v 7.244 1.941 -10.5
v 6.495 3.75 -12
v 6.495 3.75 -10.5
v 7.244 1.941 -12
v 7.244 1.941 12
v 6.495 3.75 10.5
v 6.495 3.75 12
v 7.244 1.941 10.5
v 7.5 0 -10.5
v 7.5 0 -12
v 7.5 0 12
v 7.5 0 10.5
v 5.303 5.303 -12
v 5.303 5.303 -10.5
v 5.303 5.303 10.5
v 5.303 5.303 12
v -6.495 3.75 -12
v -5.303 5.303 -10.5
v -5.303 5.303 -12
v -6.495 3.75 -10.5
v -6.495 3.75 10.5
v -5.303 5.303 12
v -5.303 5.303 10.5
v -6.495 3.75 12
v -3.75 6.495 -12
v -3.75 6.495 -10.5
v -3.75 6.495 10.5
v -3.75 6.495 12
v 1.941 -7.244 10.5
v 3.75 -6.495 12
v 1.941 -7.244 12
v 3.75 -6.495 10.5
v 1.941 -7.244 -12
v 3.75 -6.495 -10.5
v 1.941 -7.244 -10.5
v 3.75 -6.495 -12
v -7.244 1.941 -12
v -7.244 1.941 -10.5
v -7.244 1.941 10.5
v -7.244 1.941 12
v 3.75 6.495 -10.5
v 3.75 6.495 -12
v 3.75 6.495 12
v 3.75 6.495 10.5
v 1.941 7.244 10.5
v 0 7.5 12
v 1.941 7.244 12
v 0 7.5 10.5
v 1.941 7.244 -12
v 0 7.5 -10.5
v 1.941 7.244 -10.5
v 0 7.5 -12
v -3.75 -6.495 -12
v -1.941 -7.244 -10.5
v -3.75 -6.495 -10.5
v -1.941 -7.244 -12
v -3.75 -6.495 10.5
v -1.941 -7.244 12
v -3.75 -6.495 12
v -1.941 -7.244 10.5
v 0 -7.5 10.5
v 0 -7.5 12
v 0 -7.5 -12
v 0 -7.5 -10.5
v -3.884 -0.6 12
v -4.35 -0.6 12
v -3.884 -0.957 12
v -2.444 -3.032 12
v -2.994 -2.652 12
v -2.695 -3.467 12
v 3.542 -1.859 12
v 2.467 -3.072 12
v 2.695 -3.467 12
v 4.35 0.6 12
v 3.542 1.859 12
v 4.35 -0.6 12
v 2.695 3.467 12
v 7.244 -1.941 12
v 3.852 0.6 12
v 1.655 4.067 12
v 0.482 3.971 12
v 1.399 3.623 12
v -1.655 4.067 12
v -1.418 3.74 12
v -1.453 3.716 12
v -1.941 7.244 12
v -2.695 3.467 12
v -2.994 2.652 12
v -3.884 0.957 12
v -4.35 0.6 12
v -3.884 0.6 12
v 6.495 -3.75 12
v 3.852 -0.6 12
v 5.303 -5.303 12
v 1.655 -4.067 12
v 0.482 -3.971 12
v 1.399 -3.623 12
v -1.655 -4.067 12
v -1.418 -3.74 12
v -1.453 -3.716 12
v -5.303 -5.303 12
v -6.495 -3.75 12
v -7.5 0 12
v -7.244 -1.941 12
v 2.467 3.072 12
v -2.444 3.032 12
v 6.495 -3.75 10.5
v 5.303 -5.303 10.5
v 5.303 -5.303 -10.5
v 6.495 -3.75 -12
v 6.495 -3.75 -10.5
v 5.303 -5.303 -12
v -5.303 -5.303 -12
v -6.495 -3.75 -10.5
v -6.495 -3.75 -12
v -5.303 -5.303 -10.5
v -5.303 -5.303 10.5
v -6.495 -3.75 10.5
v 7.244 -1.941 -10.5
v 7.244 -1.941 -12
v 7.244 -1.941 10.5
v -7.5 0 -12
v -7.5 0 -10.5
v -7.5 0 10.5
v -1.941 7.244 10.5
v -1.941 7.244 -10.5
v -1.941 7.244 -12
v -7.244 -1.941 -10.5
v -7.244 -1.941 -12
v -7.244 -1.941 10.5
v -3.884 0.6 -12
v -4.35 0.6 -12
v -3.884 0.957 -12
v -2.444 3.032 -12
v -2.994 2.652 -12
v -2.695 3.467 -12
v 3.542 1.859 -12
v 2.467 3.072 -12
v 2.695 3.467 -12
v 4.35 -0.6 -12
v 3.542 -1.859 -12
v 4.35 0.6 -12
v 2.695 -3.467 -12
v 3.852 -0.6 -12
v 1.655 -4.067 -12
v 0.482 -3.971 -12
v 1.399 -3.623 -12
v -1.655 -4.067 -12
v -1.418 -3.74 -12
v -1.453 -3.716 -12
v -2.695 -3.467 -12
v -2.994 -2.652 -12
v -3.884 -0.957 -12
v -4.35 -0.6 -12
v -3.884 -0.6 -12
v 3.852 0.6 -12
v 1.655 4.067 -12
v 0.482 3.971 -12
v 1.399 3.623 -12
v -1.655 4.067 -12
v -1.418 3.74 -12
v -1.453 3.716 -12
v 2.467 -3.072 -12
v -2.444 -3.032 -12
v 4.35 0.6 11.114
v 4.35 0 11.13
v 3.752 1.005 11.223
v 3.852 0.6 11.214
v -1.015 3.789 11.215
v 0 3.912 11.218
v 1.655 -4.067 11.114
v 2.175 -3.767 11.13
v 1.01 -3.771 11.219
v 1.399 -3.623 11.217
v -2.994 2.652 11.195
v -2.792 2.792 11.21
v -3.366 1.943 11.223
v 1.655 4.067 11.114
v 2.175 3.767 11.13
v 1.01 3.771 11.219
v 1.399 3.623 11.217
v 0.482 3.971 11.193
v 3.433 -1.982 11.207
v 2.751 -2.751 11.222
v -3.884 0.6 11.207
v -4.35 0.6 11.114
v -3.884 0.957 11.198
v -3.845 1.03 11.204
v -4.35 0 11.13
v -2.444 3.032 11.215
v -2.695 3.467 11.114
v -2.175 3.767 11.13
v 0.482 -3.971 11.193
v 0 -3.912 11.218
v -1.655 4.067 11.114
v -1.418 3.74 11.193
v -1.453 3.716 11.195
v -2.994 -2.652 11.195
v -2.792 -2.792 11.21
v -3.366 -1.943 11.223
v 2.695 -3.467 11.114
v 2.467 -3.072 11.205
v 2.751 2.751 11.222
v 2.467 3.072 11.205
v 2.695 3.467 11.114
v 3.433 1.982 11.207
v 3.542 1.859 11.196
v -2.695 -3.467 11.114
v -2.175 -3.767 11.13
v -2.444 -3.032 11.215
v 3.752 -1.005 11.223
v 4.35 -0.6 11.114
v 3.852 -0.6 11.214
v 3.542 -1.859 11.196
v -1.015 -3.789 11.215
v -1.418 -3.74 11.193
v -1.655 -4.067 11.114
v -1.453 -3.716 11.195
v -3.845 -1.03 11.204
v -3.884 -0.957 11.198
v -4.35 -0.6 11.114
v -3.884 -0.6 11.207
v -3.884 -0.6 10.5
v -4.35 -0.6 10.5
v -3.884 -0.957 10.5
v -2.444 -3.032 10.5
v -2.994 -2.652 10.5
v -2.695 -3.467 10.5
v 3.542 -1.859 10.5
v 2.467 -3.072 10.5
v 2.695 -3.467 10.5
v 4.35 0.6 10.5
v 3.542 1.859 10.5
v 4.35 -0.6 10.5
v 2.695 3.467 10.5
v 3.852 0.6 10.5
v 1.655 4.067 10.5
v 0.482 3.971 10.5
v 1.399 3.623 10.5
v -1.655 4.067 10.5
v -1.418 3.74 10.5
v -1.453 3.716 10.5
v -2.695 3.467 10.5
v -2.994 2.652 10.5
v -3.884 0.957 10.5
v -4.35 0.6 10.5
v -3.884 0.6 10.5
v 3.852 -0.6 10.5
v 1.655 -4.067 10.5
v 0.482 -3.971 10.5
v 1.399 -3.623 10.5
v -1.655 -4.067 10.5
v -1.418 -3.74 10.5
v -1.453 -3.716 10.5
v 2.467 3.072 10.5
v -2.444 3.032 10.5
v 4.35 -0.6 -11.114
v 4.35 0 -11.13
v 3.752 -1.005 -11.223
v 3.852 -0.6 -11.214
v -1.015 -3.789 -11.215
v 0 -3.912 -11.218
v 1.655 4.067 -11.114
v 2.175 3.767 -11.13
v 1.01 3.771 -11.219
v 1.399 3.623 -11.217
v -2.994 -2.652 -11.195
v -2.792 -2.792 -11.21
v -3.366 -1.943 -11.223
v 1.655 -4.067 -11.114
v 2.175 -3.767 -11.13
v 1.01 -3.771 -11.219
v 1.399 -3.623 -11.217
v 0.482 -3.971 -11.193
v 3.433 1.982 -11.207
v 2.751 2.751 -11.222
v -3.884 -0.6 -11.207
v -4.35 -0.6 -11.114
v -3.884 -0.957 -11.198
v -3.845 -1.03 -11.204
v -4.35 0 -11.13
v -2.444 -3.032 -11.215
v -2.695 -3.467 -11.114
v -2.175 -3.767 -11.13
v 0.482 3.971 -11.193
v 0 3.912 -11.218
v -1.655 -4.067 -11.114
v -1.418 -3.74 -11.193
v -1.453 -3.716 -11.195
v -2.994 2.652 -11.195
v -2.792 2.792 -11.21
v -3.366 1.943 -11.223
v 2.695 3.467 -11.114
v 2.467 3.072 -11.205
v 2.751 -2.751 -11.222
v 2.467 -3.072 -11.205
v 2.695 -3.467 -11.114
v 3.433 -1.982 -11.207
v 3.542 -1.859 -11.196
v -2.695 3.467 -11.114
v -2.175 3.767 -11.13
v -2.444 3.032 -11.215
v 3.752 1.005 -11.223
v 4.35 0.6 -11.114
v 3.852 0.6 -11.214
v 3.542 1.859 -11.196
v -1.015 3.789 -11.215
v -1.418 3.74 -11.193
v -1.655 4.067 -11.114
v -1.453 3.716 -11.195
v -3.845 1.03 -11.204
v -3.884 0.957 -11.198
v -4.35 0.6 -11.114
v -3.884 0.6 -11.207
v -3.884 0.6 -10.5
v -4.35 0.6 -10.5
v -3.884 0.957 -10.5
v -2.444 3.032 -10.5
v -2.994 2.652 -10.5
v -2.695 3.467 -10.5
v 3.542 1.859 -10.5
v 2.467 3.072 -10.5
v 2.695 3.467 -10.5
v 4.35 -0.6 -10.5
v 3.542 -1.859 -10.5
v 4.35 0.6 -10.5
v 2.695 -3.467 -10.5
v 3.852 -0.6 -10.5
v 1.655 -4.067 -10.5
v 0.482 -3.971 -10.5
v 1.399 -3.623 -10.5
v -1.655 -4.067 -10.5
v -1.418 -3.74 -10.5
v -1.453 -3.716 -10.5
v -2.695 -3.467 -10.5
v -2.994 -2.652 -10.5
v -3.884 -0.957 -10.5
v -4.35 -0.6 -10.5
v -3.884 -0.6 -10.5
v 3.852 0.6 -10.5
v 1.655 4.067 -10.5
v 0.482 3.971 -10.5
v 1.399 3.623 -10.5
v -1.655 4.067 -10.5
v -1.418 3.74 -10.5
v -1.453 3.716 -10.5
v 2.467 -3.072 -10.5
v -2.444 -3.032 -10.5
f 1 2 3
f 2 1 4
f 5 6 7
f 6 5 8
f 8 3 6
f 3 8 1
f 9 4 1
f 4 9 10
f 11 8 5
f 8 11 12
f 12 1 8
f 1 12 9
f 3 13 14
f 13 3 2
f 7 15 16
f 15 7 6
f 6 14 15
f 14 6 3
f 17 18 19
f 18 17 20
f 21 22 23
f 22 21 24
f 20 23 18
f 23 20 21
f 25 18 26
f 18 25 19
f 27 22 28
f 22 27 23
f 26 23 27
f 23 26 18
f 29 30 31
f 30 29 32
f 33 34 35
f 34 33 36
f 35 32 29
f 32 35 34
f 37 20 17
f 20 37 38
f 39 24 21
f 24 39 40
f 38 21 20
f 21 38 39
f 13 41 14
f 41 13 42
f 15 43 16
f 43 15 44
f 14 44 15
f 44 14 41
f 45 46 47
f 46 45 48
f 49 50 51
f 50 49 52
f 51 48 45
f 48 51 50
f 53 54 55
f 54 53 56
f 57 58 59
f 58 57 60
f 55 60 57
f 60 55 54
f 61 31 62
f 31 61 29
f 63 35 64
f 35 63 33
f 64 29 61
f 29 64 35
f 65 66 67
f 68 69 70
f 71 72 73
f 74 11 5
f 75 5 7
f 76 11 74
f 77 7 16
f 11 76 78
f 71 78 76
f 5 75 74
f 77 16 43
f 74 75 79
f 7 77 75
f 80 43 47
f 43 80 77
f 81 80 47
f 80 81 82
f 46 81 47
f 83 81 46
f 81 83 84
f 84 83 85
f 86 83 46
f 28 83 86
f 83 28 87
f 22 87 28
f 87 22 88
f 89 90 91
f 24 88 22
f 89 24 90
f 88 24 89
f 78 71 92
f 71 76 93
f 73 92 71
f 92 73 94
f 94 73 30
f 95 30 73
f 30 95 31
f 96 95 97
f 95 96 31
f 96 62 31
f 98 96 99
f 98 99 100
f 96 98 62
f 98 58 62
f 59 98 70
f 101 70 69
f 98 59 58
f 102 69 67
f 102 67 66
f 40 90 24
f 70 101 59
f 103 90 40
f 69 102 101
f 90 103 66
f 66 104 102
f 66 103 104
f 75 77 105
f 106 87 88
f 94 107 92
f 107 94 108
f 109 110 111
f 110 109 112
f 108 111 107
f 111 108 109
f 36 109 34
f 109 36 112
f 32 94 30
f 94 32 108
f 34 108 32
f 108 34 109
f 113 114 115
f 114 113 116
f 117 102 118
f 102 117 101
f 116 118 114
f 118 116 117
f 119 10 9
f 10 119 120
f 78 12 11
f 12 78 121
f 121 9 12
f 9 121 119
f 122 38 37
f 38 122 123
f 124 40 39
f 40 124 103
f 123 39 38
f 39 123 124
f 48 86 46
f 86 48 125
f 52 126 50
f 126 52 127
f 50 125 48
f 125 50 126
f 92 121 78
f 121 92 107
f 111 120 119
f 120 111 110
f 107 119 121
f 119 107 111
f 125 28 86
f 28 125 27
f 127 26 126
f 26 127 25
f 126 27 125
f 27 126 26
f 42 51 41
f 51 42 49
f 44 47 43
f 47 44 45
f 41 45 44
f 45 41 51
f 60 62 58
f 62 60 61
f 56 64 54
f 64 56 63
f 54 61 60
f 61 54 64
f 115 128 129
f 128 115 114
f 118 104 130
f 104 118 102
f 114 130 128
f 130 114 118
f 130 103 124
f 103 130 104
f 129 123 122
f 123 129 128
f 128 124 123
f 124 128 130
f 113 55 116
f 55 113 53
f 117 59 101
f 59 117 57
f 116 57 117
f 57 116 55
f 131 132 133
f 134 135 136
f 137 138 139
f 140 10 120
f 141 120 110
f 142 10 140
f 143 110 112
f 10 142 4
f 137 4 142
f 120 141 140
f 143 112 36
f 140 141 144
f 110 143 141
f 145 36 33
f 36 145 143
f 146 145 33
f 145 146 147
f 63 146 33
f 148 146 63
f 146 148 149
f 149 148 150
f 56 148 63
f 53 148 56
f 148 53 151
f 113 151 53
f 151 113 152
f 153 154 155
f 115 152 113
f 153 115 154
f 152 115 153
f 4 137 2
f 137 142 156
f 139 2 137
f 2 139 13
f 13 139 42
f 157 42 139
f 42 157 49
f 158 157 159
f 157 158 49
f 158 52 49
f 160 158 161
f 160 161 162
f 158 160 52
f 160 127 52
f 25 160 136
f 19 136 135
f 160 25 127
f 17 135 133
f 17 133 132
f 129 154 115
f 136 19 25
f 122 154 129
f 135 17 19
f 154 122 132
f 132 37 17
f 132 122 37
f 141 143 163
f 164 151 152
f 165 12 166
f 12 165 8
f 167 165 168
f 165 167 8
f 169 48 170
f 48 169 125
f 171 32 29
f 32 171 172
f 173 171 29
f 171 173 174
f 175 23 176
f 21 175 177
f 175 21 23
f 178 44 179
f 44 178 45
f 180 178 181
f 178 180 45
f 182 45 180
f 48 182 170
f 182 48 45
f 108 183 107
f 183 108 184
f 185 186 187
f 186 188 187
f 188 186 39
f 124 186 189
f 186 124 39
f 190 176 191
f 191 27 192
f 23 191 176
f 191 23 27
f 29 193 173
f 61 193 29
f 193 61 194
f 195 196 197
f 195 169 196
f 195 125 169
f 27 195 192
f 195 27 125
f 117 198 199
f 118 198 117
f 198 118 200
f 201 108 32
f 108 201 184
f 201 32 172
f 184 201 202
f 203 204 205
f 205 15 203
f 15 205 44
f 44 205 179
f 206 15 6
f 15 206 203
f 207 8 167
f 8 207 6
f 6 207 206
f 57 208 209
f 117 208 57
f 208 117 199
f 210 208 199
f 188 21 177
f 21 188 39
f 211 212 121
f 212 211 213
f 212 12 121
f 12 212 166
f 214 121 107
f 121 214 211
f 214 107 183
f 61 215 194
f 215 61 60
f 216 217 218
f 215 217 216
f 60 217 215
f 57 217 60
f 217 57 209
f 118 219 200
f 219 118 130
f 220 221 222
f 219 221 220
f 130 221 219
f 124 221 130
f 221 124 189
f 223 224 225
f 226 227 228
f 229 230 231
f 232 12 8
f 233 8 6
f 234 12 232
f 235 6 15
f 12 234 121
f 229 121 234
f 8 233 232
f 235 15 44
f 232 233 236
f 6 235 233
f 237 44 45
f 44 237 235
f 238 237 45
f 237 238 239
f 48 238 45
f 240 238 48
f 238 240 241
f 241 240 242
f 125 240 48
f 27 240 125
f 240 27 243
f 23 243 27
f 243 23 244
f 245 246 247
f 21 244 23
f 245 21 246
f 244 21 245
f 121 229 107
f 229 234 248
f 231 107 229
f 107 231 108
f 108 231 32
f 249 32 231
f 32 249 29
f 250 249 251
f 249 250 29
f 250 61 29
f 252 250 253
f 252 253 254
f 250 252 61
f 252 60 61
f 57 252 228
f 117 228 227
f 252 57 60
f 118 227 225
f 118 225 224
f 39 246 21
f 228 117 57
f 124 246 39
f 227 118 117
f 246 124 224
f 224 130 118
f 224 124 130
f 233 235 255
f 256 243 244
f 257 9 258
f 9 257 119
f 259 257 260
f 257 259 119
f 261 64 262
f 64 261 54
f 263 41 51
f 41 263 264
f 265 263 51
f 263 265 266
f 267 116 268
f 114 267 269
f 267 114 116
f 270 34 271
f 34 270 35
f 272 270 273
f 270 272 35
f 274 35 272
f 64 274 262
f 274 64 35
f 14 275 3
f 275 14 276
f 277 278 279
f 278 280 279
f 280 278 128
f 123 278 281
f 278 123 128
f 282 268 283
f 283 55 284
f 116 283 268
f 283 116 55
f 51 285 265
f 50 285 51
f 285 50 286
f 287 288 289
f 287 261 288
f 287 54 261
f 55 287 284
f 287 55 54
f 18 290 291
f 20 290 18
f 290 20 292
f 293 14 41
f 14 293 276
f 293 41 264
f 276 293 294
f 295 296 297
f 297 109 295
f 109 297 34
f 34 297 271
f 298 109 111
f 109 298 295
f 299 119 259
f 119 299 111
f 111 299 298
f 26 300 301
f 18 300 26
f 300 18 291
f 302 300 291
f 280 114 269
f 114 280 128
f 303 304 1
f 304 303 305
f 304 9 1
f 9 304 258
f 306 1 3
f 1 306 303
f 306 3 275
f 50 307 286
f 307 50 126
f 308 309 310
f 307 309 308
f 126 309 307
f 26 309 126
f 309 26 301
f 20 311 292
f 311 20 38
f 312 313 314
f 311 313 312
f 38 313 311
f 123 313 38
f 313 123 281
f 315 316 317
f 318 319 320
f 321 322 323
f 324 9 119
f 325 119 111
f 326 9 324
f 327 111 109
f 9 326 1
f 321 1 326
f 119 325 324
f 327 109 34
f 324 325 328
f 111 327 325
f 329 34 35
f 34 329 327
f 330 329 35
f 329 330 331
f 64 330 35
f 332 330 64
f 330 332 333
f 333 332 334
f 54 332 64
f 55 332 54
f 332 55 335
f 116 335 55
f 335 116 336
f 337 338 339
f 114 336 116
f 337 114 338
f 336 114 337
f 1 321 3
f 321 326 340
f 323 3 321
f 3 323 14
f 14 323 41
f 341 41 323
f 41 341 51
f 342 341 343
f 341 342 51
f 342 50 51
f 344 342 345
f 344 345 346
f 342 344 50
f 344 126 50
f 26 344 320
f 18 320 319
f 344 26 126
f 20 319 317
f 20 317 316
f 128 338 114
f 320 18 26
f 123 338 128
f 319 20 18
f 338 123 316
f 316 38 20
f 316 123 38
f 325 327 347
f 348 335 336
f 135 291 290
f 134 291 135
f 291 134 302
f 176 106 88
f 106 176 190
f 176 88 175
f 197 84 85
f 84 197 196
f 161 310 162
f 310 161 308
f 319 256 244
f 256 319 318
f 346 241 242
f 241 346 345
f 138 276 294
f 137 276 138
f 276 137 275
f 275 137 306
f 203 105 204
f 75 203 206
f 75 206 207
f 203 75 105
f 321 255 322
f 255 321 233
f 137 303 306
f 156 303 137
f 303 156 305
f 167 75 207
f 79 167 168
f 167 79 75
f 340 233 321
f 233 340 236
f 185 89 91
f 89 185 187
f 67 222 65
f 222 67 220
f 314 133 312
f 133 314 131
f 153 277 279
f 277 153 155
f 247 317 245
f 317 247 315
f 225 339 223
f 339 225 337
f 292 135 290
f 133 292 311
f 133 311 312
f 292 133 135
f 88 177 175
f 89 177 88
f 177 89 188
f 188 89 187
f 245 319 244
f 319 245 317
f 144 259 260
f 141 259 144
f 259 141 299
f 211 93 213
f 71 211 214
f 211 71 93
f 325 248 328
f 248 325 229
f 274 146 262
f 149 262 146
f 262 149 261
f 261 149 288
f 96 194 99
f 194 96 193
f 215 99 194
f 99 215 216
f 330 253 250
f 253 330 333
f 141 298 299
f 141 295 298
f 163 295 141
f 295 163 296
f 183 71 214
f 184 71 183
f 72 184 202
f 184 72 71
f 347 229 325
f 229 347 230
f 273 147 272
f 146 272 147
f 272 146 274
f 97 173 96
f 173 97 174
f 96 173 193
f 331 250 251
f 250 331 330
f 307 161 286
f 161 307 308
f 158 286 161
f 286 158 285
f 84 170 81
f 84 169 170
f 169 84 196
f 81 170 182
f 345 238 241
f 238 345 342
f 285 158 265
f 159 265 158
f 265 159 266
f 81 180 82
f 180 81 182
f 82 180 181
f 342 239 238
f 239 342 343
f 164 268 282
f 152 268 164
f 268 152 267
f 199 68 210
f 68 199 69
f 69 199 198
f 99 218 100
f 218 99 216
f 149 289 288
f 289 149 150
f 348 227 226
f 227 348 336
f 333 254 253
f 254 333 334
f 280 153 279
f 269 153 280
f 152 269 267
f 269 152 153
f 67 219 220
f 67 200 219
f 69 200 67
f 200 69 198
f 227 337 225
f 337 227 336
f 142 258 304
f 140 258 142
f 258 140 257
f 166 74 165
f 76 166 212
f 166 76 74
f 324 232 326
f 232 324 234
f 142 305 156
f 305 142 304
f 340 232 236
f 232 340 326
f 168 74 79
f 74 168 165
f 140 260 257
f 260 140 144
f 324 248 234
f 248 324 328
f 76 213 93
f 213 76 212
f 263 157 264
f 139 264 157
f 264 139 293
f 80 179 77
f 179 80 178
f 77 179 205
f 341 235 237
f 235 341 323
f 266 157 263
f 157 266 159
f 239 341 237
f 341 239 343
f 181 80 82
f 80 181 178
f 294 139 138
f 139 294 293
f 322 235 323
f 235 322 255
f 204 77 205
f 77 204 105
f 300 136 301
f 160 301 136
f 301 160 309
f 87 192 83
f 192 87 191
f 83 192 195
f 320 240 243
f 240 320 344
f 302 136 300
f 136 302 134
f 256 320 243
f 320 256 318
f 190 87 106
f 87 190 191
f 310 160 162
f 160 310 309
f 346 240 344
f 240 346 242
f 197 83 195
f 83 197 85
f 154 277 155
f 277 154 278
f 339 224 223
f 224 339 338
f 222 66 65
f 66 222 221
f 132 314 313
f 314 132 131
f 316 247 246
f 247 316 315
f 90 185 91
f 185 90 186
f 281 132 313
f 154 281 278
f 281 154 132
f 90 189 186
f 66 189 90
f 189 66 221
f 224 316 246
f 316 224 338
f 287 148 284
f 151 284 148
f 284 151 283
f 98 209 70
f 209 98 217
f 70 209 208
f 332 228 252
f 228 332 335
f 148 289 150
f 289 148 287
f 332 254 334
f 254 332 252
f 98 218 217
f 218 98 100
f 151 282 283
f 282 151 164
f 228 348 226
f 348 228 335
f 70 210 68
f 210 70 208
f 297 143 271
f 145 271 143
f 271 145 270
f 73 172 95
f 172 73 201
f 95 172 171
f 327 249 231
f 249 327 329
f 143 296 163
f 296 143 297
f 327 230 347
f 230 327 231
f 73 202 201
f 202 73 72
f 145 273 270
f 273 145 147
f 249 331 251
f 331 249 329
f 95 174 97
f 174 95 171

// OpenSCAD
// Parameters
bore_d = 8.0; //[4.0:16.0:0.1]
outer_d = 15.0; //[8.0:30.0:0.1]
length = 24.0; //[12.0:48.0:0.1]
chamfer_len = 0.5; //[0.2:2.0:0.1]
overlap = 1.0; //[0.5:2.0:0.1]
seal_groove_width = 1.2; //[0.6:3.0:0.1]
seal_groove_depth = 0.4; //[0.2:1.2:0.1]
seal_groove_offset = 2.0; //[1.0:6.0:0.1]
mark_band_width = 4.0; //[2.0:10.0:0.1]
mark_band_depth = 0.15; //[0.05:0.5:0.01]
track_count = 6; //[4:10:1]
track_width = 1.2; //[0.6:2.5:0.1]
track_depth = 0.35; //[0.15:1.0:0.05]

// Base Shapes
module outer_cylinder_body() {
  cylinder(h=length, r=outer_d/2, center=true);
}

module through_bore() {
  cylinder(h=length + 2*overlap, r=bore_d/2, center=true);
}

module end_chamfer_cone_pos() {
  translate([0, 0, length/2 - (chamfer_len + overlap)/2])
    cylinder(h=chamfer_len + overlap, r1=outer_d/2, r2=0, center=true);
}

module end_chamfer_cone_neg() {
  translate([0, 0, -length/2 + (chamfer_len + overlap)/2])
    rotate([180, 0, 0])
    cylinder(h=chamfer_len + overlap, r1=outer_d/2, r2=0, center=true);
}

module seal_groove_cyl_pos() {
  translate([0, 0, length/2 - seal_groove_offset])
    cylinder(h=seal_groove_width + 2*overlap, r=outer_d/2, center=true);
}

module seal_groove_cyl_neg() {
  translate([0, 0, -length/2 + seal_groove_offset])
    cylinder(h=seal_groove_width + 2*overlap, r=outer_d/2, center=true);
}

module mark_band_cyl() {
  cylinder(h=mark_band_width + 2*overlap, r=outer_d/2, center=true);
}

module internal_track_box_base() {
  translate([bore_d/2 - overlap + (track_depth + overlap)/2, 0, 0])
    cube([track_depth + overlap, track_width, length + 2*overlap], center=true);
}

// Operations
module end_chamfers_union() {
  union() {
    end_chamfer_cone_pos();
    end_chamfer_cone_neg();
  }
}

module seal_grooves_union() {
  union() {
    seal_groove_cyl_pos();
    seal_groove_cyl_neg();
  }
}

module seal_grooves_shell() {
  difference() {
    seal_grooves_union();
    through_bore();
    outer_cylinder_body();
  }
}

module mark_band_shell() {
  difference() {
    mark_band_cyl();
    through_bore();
    outer_cylinder_body();
  }
}

module internal_ball_tracks_representation() {
  union() {
    for (i = [0:track_count-1]) {
      rotate([0, 0, i*360/track_count])
        internal_track_box_base();
    }
  }
}

module bearing_final() {
  difference() {
    difference() {
      difference() {
        difference() {
          difference() {
            outer_cylinder_body();
            mark_band_shell();
          }
          end_chamfers_union();
        }
        seal_grooves_shell();
      }
      through_bore();
    }
    internal_ball_tracks_representation();
  }
}

// Final Output
color([0.85, 0.85, 0.8]) // Off-white for 3D printed PLA
bearing_final();
